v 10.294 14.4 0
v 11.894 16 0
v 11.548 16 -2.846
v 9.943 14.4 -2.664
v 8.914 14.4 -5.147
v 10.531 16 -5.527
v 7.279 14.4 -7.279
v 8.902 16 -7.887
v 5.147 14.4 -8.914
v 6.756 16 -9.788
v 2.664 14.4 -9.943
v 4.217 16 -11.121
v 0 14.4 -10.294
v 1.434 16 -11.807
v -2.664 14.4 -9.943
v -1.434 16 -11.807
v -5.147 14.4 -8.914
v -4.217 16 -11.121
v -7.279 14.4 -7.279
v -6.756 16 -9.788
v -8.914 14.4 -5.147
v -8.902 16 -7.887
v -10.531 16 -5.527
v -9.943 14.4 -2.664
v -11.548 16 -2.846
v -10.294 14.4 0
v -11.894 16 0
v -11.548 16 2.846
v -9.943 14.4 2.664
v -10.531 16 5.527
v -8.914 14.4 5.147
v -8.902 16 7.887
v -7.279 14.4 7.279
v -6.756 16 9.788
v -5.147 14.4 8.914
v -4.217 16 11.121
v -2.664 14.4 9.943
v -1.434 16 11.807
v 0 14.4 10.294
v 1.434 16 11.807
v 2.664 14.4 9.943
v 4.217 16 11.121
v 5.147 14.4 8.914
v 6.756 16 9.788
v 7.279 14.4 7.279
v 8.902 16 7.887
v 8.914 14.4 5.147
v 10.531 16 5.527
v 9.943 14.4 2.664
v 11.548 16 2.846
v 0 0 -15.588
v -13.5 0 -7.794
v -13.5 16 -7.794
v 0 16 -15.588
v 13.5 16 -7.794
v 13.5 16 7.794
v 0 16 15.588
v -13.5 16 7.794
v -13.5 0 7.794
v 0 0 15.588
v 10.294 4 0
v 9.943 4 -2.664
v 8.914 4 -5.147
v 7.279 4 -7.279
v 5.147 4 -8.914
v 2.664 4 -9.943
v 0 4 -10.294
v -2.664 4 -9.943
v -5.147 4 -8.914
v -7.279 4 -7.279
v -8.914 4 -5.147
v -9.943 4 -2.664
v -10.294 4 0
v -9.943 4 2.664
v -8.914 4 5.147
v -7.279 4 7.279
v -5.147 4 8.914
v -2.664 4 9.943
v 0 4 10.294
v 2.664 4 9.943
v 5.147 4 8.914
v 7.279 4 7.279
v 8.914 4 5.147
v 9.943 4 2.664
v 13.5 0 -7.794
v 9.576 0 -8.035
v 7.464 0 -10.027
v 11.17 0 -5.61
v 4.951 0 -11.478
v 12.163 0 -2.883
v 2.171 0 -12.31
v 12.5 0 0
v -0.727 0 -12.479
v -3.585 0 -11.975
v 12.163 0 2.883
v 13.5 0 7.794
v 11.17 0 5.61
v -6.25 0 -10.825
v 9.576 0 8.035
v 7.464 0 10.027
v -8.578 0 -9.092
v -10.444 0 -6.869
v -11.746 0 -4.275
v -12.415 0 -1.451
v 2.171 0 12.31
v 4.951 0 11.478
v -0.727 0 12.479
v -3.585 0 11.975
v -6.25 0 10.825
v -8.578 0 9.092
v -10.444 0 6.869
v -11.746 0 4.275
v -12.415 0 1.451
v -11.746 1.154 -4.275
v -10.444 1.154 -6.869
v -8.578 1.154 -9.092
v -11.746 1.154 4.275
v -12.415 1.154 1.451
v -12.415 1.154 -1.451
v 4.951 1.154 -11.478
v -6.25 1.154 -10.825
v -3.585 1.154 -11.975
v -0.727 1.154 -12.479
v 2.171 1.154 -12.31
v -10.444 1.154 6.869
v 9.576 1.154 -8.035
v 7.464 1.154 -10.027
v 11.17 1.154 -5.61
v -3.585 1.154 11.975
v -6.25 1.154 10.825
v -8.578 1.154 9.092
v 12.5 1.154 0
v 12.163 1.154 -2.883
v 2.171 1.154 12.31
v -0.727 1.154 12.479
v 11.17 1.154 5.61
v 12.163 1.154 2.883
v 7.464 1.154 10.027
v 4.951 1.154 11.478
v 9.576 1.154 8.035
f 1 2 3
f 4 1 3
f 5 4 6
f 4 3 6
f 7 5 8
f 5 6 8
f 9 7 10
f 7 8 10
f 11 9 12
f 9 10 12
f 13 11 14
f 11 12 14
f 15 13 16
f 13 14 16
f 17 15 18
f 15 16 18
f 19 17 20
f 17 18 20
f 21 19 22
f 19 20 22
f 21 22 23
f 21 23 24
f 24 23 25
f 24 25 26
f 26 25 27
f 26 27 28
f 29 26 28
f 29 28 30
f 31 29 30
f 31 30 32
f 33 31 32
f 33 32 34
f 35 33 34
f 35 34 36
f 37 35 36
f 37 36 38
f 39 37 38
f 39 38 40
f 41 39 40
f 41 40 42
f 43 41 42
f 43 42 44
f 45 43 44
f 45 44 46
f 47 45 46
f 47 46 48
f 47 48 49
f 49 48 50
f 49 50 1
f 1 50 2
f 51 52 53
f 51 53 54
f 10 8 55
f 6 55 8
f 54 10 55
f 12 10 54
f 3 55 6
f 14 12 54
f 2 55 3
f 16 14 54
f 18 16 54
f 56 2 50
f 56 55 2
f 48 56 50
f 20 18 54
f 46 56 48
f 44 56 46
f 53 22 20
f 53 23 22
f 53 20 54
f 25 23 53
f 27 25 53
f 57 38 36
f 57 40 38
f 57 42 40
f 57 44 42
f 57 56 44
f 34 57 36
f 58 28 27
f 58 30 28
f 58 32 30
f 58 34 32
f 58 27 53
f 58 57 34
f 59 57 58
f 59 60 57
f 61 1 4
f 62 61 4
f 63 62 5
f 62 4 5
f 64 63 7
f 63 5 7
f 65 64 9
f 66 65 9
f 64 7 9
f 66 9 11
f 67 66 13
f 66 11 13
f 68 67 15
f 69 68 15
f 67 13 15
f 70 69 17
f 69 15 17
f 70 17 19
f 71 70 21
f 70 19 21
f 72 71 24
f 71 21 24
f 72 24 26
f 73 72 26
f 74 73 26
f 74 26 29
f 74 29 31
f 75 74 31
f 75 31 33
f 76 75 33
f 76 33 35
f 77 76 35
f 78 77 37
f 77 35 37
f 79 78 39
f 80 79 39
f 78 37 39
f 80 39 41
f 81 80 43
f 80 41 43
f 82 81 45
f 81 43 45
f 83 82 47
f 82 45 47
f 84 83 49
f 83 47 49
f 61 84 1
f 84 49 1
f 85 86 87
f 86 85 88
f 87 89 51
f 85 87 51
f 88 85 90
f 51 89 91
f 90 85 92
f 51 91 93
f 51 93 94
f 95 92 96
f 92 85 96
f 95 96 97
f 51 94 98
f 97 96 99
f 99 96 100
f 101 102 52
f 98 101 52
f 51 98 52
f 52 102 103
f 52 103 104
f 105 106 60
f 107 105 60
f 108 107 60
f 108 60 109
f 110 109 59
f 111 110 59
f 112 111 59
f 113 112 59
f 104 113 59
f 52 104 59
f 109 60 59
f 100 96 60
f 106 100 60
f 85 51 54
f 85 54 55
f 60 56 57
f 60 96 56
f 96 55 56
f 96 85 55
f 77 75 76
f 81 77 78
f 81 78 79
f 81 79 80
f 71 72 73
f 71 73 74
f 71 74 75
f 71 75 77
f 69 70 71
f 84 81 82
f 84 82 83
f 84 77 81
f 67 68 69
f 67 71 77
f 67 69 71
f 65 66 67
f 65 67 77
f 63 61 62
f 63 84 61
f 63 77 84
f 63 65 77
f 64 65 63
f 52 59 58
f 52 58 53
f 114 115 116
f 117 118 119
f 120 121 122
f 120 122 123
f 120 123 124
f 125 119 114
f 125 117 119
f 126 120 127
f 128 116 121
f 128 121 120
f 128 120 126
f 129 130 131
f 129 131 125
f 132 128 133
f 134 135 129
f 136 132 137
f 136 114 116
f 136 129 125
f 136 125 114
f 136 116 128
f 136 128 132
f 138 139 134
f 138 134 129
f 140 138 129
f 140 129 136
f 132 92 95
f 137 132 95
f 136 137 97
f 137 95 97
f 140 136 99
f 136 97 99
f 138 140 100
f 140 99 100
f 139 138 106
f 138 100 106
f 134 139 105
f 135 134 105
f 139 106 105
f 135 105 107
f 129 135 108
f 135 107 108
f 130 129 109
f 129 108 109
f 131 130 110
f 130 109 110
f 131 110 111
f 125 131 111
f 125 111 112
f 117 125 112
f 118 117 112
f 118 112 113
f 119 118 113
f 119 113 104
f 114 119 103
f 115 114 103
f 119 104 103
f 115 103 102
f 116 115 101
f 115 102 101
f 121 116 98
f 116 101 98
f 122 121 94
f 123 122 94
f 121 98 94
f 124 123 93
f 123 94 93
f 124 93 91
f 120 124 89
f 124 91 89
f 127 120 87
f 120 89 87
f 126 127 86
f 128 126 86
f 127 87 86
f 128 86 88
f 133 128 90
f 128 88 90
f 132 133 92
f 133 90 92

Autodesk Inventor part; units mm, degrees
ref_plane "YZ Plane" through (0, 0, 0) normal (1, 0, 0) x (0, 1, 0)
ref_plane "XZ Plane" through (0, 0, 0) normal (0, 1, 0) x (-1, 0, 0)
ref_plane "XY Plane" through (0, 0, 0) normal (0, 0, 1) x (1, 0, 0)
sketch "Эскиз1" plane through (0, 0, 0) normal (0, 0, 1) x (1, 0, 0)
  point P0 (0, 0)
sketch "Эскиз2" plane through (0, 0, 0) normal (0, 1, 0) x (-1, 0, 0)
  line L0 (0, 15.5885) -> (13.5, 7.7942)
  line L1 (13.5, 7.7942) -> (13.5, -7.7942)
  line L2 (13.5, -7.7942) -> (0, -15.5885)
  line L3 (0, -15.5885) -> (-13.5, -7.7942)
  line L4 (-13.5, -7.7942) -> (-13.5, 7.7942)
  line L5 (-13.5, 7.7942) -> (0, 15.5885)
  point P0 (0, 0)
  point P1 (0, 0)
  dimension "d0" = 27
extrude "Выдавливание1" add sketch "Эскиз2" along normal blind 16
sketch "Эскиз3" plane through (0, 0, 0) normal (0, -1, 0) x (1, 0, 0)
  circle A0 centre (0, 0) radius 12.5
  dimension "d3" = 25
sketch "Эскиз4" plane through (0, 16, 0) normal (0, 1, 0) x (1, 0, 0)
  circle A0 centre (0, 0) radius 10.2935
  dimension "d4" = 20.587
extrude "Выдавливание2" cut sketch "Эскиз4" against normal blind 12
thread "Резьба1" size "G 5/8-14" standard "BSP Pipe Threads" length 10 offset 2
chamfer "Фаска1" distance 1.6 angle 45 1 edges at (-10.2935, 16, 0) measured on face at (10.1602, 8, 1.6512)
extrude "Выдавливание3" cut sketch "Эскиз3" against normal blind 1.154
properties part number "Поз10 Заглушка"
